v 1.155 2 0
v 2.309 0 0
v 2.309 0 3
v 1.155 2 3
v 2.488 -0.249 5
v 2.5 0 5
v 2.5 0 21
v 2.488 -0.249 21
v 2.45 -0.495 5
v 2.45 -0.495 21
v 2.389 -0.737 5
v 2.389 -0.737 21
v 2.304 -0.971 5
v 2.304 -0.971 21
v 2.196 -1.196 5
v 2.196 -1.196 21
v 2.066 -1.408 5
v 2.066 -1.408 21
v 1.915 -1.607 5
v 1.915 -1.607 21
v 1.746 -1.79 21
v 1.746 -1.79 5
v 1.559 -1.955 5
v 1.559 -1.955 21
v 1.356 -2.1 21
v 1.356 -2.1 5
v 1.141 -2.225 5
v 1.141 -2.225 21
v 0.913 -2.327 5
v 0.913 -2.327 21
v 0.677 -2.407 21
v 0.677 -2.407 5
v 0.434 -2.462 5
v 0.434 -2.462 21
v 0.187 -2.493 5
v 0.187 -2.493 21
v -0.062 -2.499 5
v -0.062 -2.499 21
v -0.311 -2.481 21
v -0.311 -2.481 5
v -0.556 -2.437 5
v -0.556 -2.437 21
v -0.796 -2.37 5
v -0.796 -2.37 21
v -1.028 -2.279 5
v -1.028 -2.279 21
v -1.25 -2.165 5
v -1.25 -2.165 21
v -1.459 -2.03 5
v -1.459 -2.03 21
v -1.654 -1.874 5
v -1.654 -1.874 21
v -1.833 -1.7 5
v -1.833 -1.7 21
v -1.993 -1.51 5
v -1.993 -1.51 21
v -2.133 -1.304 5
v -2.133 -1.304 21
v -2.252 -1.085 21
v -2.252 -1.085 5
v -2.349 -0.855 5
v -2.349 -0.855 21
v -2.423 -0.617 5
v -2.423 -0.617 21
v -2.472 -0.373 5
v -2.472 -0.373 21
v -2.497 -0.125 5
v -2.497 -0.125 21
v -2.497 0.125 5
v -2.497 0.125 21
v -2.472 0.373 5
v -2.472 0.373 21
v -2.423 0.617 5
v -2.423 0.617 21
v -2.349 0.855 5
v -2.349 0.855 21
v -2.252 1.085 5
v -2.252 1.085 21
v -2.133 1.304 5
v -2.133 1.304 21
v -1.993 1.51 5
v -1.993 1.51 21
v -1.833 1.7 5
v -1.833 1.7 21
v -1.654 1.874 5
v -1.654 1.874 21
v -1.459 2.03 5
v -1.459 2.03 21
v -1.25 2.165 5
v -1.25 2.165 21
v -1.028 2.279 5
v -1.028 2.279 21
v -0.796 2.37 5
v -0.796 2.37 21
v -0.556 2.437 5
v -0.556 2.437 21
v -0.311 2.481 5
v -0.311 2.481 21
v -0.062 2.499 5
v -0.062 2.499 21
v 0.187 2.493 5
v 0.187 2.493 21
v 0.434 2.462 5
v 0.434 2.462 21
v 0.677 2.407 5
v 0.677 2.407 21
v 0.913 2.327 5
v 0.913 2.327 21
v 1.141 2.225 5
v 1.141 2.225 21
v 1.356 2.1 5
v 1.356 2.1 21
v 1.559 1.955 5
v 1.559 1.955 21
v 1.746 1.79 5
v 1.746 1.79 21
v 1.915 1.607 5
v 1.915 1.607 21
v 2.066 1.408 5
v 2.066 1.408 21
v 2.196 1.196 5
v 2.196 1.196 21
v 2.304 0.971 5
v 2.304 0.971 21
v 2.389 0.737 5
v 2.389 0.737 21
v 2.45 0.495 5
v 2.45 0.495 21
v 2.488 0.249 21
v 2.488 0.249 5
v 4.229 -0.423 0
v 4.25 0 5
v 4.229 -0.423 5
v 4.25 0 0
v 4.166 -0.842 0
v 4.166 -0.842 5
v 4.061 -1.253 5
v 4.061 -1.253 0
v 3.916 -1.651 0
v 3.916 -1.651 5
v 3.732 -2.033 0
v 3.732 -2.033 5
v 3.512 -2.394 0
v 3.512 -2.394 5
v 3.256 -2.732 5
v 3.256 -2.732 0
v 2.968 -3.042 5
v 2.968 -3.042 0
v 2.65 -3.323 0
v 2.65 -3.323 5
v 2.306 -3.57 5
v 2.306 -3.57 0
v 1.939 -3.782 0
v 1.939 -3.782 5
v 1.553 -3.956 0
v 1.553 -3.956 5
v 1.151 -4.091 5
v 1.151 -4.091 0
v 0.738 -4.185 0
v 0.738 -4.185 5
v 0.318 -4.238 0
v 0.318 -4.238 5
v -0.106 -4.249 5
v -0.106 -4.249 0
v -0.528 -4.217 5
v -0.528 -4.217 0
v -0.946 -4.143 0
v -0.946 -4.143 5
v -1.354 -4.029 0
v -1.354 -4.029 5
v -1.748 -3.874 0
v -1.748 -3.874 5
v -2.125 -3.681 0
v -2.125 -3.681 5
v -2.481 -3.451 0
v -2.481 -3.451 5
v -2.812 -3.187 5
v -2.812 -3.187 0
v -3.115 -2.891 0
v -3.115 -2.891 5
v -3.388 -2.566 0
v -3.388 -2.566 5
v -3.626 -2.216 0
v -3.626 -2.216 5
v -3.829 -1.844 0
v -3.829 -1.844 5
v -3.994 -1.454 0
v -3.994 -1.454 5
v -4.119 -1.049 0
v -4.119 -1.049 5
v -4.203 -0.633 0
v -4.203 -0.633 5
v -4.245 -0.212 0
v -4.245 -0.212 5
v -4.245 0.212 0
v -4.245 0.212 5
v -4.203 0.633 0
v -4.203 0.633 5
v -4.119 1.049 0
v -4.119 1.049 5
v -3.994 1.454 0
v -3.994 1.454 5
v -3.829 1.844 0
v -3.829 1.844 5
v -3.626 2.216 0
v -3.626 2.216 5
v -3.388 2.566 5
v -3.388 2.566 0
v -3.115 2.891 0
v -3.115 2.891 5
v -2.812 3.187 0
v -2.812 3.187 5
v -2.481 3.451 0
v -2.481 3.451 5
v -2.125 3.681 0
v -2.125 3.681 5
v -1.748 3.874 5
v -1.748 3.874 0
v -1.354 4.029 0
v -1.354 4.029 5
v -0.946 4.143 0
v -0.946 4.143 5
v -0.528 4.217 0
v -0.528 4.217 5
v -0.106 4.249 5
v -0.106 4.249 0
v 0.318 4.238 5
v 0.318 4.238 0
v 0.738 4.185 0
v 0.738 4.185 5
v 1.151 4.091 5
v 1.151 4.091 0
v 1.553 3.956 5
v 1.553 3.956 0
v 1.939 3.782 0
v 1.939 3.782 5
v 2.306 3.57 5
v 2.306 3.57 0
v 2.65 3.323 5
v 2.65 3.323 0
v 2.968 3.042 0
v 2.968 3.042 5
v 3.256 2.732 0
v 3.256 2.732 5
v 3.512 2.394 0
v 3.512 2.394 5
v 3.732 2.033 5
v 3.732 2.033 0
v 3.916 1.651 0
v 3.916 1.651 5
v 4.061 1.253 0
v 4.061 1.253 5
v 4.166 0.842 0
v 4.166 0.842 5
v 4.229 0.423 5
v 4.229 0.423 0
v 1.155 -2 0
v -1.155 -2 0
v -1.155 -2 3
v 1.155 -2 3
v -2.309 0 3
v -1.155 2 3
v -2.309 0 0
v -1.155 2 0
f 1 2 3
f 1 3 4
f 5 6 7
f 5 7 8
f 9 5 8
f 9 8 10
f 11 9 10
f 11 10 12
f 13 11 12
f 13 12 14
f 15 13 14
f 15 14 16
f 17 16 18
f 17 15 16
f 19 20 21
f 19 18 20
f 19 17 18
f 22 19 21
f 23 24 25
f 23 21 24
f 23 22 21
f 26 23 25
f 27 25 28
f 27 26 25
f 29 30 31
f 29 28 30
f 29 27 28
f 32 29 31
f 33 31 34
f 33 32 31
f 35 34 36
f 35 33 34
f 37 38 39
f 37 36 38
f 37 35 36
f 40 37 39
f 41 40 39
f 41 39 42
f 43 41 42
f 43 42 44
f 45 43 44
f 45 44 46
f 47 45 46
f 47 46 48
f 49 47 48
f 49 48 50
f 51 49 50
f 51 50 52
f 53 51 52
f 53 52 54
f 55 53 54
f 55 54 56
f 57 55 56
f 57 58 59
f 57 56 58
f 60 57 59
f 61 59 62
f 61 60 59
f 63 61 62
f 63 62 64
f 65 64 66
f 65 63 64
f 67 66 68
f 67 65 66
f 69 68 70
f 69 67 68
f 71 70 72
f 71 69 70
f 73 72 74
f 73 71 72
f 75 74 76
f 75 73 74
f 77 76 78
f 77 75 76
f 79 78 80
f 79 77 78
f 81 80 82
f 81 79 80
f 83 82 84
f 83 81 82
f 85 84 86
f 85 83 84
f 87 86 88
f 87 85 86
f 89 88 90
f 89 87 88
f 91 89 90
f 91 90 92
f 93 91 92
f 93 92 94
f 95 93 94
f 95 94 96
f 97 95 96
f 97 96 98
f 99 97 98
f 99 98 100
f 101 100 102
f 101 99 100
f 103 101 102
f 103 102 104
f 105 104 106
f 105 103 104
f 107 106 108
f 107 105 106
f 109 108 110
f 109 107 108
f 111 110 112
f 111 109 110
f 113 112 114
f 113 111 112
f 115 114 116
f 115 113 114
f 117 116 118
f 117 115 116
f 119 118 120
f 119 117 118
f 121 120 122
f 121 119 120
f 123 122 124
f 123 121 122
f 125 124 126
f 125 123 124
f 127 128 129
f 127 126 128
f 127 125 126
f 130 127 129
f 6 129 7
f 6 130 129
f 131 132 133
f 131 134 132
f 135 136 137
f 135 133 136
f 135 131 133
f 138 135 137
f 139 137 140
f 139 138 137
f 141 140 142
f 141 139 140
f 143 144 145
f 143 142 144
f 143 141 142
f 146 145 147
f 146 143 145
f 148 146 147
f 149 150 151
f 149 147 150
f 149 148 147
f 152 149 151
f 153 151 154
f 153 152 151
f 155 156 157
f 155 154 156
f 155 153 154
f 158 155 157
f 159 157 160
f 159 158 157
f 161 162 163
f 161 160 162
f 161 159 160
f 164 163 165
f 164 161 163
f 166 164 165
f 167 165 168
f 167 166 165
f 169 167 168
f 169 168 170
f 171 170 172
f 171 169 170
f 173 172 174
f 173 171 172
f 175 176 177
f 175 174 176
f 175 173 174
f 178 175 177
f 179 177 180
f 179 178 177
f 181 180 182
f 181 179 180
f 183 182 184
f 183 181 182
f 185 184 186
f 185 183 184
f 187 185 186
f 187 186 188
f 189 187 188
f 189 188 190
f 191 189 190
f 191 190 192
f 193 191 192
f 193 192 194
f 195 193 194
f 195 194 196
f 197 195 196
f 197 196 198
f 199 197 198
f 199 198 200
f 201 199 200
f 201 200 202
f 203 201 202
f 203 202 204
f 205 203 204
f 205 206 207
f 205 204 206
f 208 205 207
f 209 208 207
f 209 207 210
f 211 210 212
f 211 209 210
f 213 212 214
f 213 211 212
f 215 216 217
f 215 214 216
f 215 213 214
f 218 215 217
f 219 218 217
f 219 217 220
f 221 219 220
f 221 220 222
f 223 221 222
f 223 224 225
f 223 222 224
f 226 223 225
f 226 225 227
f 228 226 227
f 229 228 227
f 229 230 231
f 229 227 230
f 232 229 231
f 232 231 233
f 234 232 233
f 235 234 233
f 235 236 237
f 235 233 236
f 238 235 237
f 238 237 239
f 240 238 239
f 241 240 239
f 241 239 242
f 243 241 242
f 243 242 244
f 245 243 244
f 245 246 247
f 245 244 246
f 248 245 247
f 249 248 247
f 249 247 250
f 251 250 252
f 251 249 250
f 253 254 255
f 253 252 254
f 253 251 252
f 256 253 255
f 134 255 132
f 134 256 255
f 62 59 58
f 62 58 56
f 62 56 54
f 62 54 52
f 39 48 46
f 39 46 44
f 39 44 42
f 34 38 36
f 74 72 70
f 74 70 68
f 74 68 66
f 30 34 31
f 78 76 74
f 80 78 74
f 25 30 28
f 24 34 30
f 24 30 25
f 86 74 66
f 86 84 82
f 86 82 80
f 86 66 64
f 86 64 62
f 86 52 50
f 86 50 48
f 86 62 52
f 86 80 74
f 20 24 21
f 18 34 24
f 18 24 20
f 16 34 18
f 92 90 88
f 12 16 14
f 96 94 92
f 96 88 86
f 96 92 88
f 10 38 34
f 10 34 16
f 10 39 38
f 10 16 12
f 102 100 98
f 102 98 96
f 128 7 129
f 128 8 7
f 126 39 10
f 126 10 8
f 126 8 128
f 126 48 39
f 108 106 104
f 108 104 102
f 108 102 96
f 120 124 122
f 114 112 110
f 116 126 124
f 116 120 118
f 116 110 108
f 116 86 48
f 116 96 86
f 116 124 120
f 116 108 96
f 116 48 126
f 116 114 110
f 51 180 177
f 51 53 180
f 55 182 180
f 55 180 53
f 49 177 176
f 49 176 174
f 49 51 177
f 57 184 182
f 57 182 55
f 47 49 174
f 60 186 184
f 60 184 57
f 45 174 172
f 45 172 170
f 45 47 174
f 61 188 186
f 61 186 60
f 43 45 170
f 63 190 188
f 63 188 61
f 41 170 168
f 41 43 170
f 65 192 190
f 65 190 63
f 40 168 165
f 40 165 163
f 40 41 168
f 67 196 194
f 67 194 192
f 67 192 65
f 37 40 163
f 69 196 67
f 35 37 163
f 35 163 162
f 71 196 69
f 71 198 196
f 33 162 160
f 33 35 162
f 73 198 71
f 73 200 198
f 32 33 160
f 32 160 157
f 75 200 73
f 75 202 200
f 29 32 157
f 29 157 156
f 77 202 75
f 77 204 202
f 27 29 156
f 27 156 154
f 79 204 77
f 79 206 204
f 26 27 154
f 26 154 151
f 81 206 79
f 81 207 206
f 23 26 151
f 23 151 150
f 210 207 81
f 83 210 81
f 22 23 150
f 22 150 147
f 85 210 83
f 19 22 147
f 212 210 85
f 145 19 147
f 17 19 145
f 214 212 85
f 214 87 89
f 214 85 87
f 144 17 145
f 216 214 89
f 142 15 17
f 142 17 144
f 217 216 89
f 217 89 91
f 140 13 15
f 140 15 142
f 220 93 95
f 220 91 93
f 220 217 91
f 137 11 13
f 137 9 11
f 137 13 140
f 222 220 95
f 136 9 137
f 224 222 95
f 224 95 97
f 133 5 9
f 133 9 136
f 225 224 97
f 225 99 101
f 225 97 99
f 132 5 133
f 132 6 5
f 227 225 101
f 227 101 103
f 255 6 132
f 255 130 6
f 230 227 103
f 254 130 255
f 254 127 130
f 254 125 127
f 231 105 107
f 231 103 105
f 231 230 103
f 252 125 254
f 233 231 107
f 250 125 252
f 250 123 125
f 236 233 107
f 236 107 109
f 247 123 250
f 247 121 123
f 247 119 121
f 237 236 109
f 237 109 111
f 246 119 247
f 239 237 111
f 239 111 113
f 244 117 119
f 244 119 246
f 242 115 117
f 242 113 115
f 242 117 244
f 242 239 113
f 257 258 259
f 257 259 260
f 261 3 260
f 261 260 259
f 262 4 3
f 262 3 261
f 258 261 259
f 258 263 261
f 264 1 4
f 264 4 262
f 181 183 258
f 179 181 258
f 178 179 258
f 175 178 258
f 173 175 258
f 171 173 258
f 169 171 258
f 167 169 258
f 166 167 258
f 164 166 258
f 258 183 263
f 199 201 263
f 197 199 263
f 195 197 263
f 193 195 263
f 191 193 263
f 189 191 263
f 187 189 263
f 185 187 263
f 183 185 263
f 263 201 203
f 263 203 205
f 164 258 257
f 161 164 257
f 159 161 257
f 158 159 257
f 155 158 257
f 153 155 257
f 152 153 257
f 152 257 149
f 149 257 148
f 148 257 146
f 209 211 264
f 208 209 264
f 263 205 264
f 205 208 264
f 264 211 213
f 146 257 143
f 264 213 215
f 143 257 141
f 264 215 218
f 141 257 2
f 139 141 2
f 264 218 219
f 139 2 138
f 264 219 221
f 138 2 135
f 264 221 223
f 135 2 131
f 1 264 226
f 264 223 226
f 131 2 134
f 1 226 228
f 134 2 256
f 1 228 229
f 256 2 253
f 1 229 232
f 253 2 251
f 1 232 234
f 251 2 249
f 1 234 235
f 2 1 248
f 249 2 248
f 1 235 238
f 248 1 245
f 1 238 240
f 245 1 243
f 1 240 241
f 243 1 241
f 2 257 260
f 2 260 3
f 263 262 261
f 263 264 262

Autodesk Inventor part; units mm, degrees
ref_plane "YZ Plane" through (0, 0, 0) normal (1, 0, 0) x (0, 1, 0)
ref_plane "XZ Plane" through (0, 0, 0) normal (0, 1, 0) x (-1, 0, 0)
ref_plane "XY Plane" through (0, 0, 0) normal (0, 0, 1) x (1, 0, 0)
sketch "Sketch1" plane through (0, 0, 0) normal (0, 0, 1) x (1, 0, 0)
  circle A0 centre (0, 0) radius 4.25
  dimension "d0" = 8.5
extrude "Extrusion1" add sketch "Sketch1" along normal blind 5
sketch "Sketch2" plane through (0, 0, 5) normal (0, 0, 1) x (1, 0, 0)
  circle A0 centre (0, 0) radius 4.25 projected
  circle A1 centre (0, 0) radius 2.5
  dimension "d3" = 5
extrude "Extrusion2" add sketch "Sketch2" along normal blind 16 contours A1
sketch "Sketch3" plane through (0, 0, 0) normal (0, 0, -1) x (-1, 0, 0)
  circle A0 centre (0, 0) radius 4.25 projected
  line L0 (2.3094, 0) -> (1.1547, -2)
  line L1 (1.1547, -2) -> (-1.1547, -2)
  line L2 (-1.1547, -2) -> (-2.3094, 0)
  line L3 (-2.3094, 0) -> (-1.1547, 2)
  line L4 (-1.1547, 2) -> (1.1547, 2)
  line L5 (1.1547, 2) -> (2.3094, 0)
  dimension "d6" = 4
extrude "Extrusion3" cut sketch "Sketch3" against normal blind 3 contours L0 L1 L2 L3 L4 L5
thread "Thread1" size "M5x0.8" class "6g" standard "ANSI Metric M Profile" full length
properties part number "m5x1"
